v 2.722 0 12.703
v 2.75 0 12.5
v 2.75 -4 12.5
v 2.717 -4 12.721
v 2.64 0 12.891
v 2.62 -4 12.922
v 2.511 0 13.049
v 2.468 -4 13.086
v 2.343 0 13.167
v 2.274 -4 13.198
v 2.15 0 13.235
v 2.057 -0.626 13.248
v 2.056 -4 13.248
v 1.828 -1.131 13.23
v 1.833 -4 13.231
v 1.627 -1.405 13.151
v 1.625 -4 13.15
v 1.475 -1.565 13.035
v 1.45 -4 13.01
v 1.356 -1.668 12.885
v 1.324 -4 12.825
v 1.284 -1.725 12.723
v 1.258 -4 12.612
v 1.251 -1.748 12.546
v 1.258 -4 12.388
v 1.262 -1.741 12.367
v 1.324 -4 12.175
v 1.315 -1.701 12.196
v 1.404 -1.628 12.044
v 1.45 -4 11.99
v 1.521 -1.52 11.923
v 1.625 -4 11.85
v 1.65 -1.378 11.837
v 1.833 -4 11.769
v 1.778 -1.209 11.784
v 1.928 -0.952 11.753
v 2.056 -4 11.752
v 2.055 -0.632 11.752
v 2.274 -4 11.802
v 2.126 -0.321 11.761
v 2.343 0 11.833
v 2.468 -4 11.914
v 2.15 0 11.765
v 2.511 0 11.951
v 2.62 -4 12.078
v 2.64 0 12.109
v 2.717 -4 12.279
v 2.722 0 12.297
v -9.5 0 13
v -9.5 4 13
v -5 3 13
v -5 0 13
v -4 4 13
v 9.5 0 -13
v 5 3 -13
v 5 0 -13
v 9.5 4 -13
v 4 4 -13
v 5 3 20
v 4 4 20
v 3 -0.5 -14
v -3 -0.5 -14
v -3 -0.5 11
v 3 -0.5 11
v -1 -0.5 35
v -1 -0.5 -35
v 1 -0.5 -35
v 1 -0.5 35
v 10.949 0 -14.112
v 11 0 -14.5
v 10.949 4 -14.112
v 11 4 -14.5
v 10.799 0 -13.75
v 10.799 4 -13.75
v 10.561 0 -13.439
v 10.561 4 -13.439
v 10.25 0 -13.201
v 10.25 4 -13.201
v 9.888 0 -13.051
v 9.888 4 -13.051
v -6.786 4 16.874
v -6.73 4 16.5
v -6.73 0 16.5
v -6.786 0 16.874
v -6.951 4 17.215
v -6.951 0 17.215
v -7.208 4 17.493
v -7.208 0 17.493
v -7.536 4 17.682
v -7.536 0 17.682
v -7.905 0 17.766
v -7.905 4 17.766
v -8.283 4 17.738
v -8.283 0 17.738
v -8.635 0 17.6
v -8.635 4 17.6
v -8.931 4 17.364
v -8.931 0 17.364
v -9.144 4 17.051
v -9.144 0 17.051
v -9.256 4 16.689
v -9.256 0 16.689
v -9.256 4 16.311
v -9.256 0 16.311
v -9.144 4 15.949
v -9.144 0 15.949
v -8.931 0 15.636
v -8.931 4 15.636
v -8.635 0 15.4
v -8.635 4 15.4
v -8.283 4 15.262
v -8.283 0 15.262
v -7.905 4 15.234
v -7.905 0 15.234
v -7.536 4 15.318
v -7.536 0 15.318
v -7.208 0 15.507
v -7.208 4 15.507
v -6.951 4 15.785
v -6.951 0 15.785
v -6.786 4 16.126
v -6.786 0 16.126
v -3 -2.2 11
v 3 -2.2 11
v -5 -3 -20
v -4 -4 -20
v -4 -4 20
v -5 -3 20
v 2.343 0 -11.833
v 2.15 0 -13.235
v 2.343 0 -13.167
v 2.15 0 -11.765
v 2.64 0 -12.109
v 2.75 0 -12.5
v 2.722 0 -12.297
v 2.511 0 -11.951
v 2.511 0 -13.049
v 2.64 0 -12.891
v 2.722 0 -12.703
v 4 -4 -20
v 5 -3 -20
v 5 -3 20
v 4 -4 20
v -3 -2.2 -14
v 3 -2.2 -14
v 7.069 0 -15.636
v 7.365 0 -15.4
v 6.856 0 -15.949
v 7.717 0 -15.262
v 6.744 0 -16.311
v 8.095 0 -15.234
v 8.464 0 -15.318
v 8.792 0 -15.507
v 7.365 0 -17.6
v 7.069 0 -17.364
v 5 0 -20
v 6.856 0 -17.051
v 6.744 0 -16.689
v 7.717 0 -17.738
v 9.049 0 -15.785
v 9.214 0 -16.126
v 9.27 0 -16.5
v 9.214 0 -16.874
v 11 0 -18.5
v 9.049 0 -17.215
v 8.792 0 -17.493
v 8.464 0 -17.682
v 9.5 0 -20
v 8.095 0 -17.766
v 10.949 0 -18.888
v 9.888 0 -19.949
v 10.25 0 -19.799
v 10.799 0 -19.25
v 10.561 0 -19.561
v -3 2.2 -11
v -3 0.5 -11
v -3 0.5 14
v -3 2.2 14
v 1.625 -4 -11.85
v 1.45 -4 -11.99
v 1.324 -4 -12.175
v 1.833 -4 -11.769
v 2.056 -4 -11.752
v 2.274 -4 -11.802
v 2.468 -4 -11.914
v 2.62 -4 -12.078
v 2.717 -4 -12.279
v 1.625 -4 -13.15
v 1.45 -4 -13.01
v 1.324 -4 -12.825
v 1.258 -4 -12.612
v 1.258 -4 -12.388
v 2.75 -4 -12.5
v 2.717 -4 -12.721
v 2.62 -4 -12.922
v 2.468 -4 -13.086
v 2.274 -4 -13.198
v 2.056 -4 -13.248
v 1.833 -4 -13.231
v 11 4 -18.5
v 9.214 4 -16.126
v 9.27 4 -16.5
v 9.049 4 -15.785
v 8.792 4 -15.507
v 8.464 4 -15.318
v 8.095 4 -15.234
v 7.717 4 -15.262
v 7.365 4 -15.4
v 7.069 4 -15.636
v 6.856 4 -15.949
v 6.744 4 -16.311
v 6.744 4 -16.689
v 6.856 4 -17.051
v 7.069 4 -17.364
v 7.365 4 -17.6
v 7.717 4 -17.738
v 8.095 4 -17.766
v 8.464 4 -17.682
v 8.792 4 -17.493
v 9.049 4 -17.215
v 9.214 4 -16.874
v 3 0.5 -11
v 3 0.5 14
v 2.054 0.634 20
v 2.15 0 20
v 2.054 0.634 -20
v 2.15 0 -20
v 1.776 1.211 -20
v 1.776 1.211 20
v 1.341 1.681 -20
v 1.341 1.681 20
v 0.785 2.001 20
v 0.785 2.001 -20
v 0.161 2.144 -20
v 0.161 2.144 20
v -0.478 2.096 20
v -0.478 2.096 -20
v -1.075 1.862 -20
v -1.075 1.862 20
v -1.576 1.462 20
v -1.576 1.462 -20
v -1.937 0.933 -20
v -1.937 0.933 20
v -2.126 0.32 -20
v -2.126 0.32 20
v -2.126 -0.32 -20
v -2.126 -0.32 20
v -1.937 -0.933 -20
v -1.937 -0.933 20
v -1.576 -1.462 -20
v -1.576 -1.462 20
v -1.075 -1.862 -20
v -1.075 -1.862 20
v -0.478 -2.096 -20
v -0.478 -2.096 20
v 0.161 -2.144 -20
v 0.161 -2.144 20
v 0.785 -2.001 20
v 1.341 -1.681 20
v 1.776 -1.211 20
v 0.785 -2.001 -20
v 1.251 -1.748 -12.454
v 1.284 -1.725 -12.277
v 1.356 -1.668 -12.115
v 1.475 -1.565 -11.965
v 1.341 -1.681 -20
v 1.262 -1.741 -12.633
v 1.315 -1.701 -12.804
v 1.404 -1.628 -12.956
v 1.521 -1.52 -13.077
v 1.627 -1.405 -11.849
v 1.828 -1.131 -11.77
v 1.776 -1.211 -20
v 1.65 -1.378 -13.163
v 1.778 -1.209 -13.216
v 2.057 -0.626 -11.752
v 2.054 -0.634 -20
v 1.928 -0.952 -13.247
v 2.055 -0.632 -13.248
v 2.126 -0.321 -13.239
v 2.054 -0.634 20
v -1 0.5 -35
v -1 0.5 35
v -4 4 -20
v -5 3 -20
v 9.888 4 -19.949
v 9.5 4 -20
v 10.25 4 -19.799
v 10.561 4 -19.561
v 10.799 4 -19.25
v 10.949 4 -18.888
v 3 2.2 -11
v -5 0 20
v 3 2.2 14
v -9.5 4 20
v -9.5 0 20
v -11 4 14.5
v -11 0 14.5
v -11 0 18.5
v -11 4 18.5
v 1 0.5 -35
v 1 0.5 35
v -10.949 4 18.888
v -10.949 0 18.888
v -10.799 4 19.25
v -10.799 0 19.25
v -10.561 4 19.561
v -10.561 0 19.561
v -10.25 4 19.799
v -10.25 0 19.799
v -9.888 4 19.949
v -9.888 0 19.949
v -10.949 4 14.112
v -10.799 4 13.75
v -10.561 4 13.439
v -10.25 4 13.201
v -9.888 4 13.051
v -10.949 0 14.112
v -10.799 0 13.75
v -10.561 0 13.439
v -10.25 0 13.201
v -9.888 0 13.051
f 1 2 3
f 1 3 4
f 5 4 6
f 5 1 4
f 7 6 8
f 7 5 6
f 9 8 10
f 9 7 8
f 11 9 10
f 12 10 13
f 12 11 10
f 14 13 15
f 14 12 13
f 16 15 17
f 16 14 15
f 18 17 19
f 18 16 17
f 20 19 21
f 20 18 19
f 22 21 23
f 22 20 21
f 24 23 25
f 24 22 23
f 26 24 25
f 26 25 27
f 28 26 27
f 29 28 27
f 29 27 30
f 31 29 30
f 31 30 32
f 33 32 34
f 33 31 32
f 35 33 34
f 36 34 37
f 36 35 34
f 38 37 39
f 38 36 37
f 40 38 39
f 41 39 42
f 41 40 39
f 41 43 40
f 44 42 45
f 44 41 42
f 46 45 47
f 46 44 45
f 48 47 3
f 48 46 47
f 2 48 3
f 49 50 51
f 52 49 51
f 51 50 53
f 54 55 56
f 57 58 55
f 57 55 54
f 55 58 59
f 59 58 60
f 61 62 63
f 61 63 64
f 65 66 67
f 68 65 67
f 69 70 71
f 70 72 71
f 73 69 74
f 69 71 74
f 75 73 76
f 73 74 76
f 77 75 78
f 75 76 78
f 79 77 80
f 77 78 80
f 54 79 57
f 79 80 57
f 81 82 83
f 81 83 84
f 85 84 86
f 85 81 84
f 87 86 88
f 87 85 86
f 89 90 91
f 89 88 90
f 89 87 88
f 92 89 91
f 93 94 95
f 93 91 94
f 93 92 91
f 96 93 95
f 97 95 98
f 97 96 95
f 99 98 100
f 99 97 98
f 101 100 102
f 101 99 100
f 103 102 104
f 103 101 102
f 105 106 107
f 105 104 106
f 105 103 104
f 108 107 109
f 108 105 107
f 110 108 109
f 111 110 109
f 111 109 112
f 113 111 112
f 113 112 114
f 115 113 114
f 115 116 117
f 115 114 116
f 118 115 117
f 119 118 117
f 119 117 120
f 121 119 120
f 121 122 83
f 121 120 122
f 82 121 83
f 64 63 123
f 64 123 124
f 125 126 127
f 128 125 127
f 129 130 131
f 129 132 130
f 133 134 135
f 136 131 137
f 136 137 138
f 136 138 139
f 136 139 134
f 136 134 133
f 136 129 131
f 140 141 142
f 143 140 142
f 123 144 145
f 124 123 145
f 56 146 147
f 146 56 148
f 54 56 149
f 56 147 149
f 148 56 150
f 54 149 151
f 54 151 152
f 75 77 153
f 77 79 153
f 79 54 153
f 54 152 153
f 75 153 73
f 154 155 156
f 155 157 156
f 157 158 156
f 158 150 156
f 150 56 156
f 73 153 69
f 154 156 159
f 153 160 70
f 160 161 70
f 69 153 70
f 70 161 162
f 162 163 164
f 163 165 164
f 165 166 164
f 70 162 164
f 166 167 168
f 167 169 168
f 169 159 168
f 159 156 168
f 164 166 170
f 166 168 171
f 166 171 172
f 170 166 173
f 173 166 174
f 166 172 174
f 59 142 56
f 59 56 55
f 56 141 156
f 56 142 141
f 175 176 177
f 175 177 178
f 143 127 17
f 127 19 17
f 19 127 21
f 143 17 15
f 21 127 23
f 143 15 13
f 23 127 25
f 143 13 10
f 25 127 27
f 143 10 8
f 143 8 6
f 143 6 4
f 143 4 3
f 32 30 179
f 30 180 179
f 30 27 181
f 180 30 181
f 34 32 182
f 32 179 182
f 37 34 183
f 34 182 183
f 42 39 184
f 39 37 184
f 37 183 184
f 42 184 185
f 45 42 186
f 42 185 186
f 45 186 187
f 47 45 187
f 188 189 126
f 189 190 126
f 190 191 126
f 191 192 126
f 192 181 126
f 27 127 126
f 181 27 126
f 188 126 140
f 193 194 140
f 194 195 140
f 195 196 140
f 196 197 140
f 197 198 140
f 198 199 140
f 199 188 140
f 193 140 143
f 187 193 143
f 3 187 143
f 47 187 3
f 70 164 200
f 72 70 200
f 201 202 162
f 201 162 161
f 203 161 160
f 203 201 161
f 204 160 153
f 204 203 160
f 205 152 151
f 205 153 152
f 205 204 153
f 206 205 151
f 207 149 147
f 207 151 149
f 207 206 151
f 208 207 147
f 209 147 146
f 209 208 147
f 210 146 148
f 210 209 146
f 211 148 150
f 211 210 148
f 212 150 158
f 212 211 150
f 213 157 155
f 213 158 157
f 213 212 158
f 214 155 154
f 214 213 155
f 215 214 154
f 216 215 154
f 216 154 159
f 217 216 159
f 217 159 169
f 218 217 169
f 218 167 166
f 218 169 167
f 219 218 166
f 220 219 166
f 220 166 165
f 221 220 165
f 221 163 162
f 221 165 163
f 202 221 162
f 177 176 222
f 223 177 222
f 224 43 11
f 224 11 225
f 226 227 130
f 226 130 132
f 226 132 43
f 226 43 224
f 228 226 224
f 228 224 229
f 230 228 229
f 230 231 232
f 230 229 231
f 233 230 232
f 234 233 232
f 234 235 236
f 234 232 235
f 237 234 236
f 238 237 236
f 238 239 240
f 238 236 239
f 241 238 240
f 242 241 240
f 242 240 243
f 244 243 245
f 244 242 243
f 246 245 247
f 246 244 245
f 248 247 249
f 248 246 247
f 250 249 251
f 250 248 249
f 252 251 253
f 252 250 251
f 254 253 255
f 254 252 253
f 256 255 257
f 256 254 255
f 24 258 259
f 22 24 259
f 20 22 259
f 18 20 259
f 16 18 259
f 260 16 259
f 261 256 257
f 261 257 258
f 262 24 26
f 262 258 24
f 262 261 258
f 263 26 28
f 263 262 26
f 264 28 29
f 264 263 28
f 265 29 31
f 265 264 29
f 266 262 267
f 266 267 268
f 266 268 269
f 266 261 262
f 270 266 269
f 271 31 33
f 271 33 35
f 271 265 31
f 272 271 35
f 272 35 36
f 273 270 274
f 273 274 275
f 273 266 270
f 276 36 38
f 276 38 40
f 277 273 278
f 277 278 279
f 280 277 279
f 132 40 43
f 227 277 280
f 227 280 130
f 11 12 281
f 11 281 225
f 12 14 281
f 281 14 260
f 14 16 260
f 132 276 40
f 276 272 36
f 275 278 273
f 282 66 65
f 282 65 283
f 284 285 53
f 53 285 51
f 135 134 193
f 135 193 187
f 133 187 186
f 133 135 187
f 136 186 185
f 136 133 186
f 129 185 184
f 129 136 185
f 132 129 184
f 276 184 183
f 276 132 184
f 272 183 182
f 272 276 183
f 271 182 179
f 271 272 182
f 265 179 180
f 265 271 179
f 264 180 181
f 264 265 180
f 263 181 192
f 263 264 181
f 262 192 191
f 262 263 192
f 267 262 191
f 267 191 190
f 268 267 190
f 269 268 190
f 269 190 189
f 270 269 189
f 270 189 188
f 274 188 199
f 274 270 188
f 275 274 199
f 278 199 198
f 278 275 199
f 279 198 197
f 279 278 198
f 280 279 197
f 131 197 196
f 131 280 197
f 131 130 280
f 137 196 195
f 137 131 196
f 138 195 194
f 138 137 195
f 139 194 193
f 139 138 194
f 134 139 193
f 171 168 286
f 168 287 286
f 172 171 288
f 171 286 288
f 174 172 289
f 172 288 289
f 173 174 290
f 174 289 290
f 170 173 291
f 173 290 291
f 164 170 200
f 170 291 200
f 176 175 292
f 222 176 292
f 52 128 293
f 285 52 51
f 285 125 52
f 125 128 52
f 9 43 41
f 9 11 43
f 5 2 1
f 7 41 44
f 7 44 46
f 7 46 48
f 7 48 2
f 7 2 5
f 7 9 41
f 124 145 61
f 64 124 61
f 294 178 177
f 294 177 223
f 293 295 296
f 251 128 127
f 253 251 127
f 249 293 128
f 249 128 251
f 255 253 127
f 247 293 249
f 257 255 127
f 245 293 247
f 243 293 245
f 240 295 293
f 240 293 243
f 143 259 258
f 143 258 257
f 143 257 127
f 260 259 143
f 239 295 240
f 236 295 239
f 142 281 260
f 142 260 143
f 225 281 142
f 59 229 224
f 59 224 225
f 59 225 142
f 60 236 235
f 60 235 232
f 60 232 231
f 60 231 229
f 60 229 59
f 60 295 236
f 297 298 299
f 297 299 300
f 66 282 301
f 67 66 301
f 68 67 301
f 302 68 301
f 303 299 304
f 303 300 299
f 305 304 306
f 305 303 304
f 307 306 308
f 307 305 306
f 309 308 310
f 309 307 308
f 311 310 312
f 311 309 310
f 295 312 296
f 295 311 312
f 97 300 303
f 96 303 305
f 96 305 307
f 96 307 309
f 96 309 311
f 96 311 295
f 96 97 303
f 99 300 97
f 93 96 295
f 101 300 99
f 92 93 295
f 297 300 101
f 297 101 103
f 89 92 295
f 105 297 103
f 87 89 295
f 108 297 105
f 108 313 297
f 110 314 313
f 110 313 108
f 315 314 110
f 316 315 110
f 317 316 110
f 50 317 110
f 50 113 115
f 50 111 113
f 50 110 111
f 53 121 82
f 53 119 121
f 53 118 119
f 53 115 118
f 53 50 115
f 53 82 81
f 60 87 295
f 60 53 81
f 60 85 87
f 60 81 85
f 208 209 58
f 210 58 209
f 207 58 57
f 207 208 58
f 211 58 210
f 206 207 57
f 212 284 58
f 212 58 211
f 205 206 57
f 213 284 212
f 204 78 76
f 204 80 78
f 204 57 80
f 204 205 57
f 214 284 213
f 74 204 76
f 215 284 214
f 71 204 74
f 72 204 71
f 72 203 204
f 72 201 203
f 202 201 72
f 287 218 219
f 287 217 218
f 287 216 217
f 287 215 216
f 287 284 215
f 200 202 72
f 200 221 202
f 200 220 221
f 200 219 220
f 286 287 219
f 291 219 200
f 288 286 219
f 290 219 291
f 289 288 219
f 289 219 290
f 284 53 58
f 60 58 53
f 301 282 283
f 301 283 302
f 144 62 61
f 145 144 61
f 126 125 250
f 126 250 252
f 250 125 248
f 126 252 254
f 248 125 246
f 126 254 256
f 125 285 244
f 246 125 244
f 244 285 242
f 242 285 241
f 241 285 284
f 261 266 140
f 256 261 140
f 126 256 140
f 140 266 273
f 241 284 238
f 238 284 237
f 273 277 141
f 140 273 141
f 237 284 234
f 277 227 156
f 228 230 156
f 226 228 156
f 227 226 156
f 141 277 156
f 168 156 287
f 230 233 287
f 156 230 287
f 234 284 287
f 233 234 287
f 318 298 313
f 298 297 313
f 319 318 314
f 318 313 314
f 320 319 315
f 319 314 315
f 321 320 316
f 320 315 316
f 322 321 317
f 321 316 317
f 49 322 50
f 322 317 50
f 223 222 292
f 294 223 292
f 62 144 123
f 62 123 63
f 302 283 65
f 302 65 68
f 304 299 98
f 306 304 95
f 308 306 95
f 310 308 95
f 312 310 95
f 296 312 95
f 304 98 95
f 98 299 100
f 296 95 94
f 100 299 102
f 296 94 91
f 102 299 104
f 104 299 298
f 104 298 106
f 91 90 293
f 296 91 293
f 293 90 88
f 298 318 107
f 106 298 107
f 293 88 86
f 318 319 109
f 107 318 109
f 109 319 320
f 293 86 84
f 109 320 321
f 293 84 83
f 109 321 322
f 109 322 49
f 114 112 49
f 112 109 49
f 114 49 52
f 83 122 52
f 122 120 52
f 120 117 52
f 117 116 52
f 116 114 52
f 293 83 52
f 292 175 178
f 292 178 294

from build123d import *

# Parameters (mm, degrees)
BOX_W                  = 2
BOX_H                  = 1
BOX_DEPTH              = 70
BOX002_W               = 6
BOX002_H               = 1.7
BOX002_DEPTH           = 25
BOX003_W               = 6
BOX003_H               = 1.7
BOX003_DEPTH           = 25
CYLINDER002_R          = 0.75
CYLINDER002_DEPTH      = 20
CYLINDER002_ROLL_ANGLE = 90
CYLINDER001_R          = 0.75
CYLINDER001_DEPTH      = 20
CYLINDER001_ROLL_ANGLE = 90
CYLINDER_R             = 2.15
CYLINDER_DEPTH         = 60
CYLINDER003_R          = 1.27
CYLINDER003_DEPTH      = 20
CYLINDER003_ROLL_ANGLE = 90
CYLINDER004_R          = 1.27
CYLINDER004_DEPTH      = 20
CYLINDER004_ROLL_ANGLE = 90
BOX004_W               = 8
BOX004_H               = 4
BOX004_DEPTH           = 7
BOX001_W               = 10
BOX001_H               = 8
BOX001_DEPTH           = 40
CHAMFER_SIZE           = 1
CHAMFER001_SIZE        = 1
CHAMFER002_SIZE        = 1
CHAMFER003_SIZE        = 1
BOX005_W               = 8
BOX005_H               = 4
BOX005_DEPTH           = 7
FILLET_R               = 1.5
FILLET001_R            = 1.5
FILLET002_R            = 1.5
FILLET003_R            = 1.5


with BuildPart() as cube:
    # Box → Box (new body)
    with BuildSketch(Plane(origin=(-1, -0.5, -35), x_dir=(1, 0, 0), z_dir=(0, 0, 1))):
        with Locations((1, 0.5)):
            Rectangle(BOX_W, BOX_H)
    extrude(amount=BOX_DEPTH)


with BuildPart() as cube002:
    # Box002 → Box002 (new body)
    with BuildSketch(Plane(origin=(-3, -2.2, -14), x_dir=(1, 0, 0), z_dir=(0, 0, 1))):
        with Locations((3, 0.85)):
            Rectangle(BOX002_W, BOX002_H)
    extrude(amount=BOX002_DEPTH)


with BuildPart() as cube003:
    # Box003 → Box003 (new body)
    with BuildSketch(Plane(origin=(-3, 0.5, -11), x_dir=(1, 0, 0), z_dir=(0, 0, 1))):
        with Locations((3, 0.85)):
            Rectangle(BOX003_W, BOX003_H)
    extrude(amount=BOX003_DEPTH)


with BuildPart() as cylinder002:
    # Cylinder002 → Cylinder002 (new body)
    with BuildSketch(Plane.XY):
        Circle(CYLINDER002_R)
    extrude(amount=CYLINDER002_DEPTH)


with BuildPart() as cylinder002_1:
    # Cylinder002 roll: moved
    add(cylinder002.part.rotate(Axis((0, 0, 0), (1, 0, 0)), CYLINDER002_ROLL_ANGLE))


with BuildPart() as cylinder002_2:
    # Cylinder002 placement: moved
    add(cylinder002_1.part.moved(Location((2, 0, -12.5))))


with BuildPart() as cylinder001:
    # Cylinder001 → Cylinder001 (new body)
    with BuildSketch(Plane.XY):
        Circle(CYLINDER001_R)
    extrude(amount=CYLINDER001_DEPTH)


with BuildPart() as cylinder001_1:
    # Cylinder001 roll: moved
    add(cylinder001.part.rotate(Axis((0, 0, 0), (1, 0, 0)), CYLINDER001_ROLL_ANGLE))


with BuildPart() as cylinder001_2:
    # Cylinder001 placement: moved
    add(cylinder001_1.part.moved(Location((2, 0, 12.5))))


with BuildPart() as cylinder:
    # Cylinder → Cylinder (new body)
    with BuildSketch(Plane.XY.offset(-30)):
        Circle(CYLINDER_R)
    extrude(amount=CYLINDER_DEPTH)


with BuildPart() as cylinder003:
    # Cylinder003 → Cylinder003 (new body)
    with BuildSketch(Plane.XY):
        Circle(CYLINDER003_R)
    extrude(amount=CYLINDER003_DEPTH)


with BuildPart() as cylinder003_1:
    # Cylinder003 roll: moved
    add(cylinder003.part.rotate(Axis((0, 0, 0), (1, 0, 0)), CYLINDER003_ROLL_ANGLE))


with BuildPart() as cylinder003_2:
    # Cylinder003 placement: moved
    add(cylinder003_1.part.moved(Location((-8, 9, 16.5))))


with BuildPart() as cylinder004:
    # Cylinder004 → Cylinder004 (new body)
    with BuildSketch(Plane.XY):
        Circle(CYLINDER004_R)
    extrude(amount=CYLINDER004_DEPTH)


with BuildPart() as cylinder004_1:
    # Cylinder004 roll: moved
    add(cylinder004.part.rotate(Axis((0, 0, 0), (1, 0, 0)), CYLINDER004_ROLL_ANGLE))


with BuildPart() as cylinder004_2:
    # Cylinder004 placement: moved
    add(cylinder004_1.part.moved(Location((8, 9, -16.5))))


with BuildPart() as cube004:
    # Box004 → Box004 (new body)
    with BuildSketch(Plane(origin=(3, 0, -20), x_dir=(1, 0, 0), z_dir=(0, 0, 1))):
        with Locations((4, 2)):
            Rectangle(BOX004_W, BOX004_H)
    extrude(amount=BOX004_DEPTH)


with BuildPart() as fusion:
    # Box001 → Box001 (new body)
    with BuildSketch(Plane(origin=(-5, -4, -20), x_dir=(1, 0, 0), z_dir=(0, 0, 1))):
        with Locations((5, 4)):
            Rectangle(BOX001_W, BOX001_H)
    extrude(amount=BOX001_DEPTH)

    # Chamfer
    chamfer_edges = [fusion.edges().sort_by_distance(p)[0] for p in [
        (-5, -4, 0),
    ]]
    chamfer(chamfer_edges, length=CHAMFER_SIZE)

    # Chamfer001
    chamfer001_edges = [fusion.edges().sort_by_distance(p)[0] for p in [
        (5, -4, 0),
    ]]
    chamfer(chamfer001_edges, length=CHAMFER001_SIZE)

    # Chamfer002
    chamfer002_edges = [fusion.edges().sort_by_distance(p)[0] for p in [
        (5, 4, 0),
    ]]
    chamfer(chamfer002_edges, length=CHAMFER002_SIZE)

    # Chamfer003
    chamfer003_edges = [fusion.edges().sort_by_distance(p)[0] for p in [
        (-5, 4, 0),
    ]]
    chamfer(chamfer003_edges, length=CHAMFER003_SIZE)

    # Fusion: union Cube004
    add(cube004.part)


with BuildPart() as cut004:
    # Box005 → Box005 (new body)
    with BuildSketch(Plane(origin=(-11, 0, 13), x_dir=(1, 0, 0), z_dir=(0, 0, 1))):
        with Locations((4, 2)):
            Rectangle(BOX005_W, BOX005_H)
    extrude(amount=BOX005_DEPTH)

    # Fusion001: union Fusion
    add(fusion.part)

    # Cut: cut Cylinder004
    add(cylinder004_2.part, mode=Mode.SUBTRACT)

    # Cut001: cut Cylinder003
    add(cylinder003_2.part, mode=Mode.SUBTRACT)

    # Fillet
    fillet_edges = [cut004.edges().sort_by_distance(p)[0] for p in [
        (-11, 2, 20),
    ]]
    fillet(fillet_edges, radius=FILLET_R)

    # Fillet001
    fillet001_edges = [cut004.edges().sort_by_distance(p)[0] for p in [
        (-11, 2, 13),
    ]]
    fillet(fillet001_edges, radius=FILLET001_R)

    # Fillet002
    fillet002_edges = [cut004.edges().sort_by_distance(p)[0] for p in [
        (11, 2, -20),
    ]]
    fillet(fillet002_edges, radius=FILLET002_R)

    # Fillet003
    fillet003_edges = [cut004.edges().sort_by_distance(p)[0] for p in [
        (11, 2, -13),
    ]]
    fillet(fillet003_edges, radius=FILLET003_R)

    # Cut002: cut Cylinder
    add(cylinder.part, mode=Mode.SUBTRACT)

    # Cut003: cut Cylinder001
    add(cylinder001_2.part, mode=Mode.SUBTRACT)

    # Cut004: cut Cylinder002
    add(cylinder002_2.part, mode=Mode.SUBTRACT)


solid = Compound([cube.part, cube002.part, cube003.part, cut004.part])
